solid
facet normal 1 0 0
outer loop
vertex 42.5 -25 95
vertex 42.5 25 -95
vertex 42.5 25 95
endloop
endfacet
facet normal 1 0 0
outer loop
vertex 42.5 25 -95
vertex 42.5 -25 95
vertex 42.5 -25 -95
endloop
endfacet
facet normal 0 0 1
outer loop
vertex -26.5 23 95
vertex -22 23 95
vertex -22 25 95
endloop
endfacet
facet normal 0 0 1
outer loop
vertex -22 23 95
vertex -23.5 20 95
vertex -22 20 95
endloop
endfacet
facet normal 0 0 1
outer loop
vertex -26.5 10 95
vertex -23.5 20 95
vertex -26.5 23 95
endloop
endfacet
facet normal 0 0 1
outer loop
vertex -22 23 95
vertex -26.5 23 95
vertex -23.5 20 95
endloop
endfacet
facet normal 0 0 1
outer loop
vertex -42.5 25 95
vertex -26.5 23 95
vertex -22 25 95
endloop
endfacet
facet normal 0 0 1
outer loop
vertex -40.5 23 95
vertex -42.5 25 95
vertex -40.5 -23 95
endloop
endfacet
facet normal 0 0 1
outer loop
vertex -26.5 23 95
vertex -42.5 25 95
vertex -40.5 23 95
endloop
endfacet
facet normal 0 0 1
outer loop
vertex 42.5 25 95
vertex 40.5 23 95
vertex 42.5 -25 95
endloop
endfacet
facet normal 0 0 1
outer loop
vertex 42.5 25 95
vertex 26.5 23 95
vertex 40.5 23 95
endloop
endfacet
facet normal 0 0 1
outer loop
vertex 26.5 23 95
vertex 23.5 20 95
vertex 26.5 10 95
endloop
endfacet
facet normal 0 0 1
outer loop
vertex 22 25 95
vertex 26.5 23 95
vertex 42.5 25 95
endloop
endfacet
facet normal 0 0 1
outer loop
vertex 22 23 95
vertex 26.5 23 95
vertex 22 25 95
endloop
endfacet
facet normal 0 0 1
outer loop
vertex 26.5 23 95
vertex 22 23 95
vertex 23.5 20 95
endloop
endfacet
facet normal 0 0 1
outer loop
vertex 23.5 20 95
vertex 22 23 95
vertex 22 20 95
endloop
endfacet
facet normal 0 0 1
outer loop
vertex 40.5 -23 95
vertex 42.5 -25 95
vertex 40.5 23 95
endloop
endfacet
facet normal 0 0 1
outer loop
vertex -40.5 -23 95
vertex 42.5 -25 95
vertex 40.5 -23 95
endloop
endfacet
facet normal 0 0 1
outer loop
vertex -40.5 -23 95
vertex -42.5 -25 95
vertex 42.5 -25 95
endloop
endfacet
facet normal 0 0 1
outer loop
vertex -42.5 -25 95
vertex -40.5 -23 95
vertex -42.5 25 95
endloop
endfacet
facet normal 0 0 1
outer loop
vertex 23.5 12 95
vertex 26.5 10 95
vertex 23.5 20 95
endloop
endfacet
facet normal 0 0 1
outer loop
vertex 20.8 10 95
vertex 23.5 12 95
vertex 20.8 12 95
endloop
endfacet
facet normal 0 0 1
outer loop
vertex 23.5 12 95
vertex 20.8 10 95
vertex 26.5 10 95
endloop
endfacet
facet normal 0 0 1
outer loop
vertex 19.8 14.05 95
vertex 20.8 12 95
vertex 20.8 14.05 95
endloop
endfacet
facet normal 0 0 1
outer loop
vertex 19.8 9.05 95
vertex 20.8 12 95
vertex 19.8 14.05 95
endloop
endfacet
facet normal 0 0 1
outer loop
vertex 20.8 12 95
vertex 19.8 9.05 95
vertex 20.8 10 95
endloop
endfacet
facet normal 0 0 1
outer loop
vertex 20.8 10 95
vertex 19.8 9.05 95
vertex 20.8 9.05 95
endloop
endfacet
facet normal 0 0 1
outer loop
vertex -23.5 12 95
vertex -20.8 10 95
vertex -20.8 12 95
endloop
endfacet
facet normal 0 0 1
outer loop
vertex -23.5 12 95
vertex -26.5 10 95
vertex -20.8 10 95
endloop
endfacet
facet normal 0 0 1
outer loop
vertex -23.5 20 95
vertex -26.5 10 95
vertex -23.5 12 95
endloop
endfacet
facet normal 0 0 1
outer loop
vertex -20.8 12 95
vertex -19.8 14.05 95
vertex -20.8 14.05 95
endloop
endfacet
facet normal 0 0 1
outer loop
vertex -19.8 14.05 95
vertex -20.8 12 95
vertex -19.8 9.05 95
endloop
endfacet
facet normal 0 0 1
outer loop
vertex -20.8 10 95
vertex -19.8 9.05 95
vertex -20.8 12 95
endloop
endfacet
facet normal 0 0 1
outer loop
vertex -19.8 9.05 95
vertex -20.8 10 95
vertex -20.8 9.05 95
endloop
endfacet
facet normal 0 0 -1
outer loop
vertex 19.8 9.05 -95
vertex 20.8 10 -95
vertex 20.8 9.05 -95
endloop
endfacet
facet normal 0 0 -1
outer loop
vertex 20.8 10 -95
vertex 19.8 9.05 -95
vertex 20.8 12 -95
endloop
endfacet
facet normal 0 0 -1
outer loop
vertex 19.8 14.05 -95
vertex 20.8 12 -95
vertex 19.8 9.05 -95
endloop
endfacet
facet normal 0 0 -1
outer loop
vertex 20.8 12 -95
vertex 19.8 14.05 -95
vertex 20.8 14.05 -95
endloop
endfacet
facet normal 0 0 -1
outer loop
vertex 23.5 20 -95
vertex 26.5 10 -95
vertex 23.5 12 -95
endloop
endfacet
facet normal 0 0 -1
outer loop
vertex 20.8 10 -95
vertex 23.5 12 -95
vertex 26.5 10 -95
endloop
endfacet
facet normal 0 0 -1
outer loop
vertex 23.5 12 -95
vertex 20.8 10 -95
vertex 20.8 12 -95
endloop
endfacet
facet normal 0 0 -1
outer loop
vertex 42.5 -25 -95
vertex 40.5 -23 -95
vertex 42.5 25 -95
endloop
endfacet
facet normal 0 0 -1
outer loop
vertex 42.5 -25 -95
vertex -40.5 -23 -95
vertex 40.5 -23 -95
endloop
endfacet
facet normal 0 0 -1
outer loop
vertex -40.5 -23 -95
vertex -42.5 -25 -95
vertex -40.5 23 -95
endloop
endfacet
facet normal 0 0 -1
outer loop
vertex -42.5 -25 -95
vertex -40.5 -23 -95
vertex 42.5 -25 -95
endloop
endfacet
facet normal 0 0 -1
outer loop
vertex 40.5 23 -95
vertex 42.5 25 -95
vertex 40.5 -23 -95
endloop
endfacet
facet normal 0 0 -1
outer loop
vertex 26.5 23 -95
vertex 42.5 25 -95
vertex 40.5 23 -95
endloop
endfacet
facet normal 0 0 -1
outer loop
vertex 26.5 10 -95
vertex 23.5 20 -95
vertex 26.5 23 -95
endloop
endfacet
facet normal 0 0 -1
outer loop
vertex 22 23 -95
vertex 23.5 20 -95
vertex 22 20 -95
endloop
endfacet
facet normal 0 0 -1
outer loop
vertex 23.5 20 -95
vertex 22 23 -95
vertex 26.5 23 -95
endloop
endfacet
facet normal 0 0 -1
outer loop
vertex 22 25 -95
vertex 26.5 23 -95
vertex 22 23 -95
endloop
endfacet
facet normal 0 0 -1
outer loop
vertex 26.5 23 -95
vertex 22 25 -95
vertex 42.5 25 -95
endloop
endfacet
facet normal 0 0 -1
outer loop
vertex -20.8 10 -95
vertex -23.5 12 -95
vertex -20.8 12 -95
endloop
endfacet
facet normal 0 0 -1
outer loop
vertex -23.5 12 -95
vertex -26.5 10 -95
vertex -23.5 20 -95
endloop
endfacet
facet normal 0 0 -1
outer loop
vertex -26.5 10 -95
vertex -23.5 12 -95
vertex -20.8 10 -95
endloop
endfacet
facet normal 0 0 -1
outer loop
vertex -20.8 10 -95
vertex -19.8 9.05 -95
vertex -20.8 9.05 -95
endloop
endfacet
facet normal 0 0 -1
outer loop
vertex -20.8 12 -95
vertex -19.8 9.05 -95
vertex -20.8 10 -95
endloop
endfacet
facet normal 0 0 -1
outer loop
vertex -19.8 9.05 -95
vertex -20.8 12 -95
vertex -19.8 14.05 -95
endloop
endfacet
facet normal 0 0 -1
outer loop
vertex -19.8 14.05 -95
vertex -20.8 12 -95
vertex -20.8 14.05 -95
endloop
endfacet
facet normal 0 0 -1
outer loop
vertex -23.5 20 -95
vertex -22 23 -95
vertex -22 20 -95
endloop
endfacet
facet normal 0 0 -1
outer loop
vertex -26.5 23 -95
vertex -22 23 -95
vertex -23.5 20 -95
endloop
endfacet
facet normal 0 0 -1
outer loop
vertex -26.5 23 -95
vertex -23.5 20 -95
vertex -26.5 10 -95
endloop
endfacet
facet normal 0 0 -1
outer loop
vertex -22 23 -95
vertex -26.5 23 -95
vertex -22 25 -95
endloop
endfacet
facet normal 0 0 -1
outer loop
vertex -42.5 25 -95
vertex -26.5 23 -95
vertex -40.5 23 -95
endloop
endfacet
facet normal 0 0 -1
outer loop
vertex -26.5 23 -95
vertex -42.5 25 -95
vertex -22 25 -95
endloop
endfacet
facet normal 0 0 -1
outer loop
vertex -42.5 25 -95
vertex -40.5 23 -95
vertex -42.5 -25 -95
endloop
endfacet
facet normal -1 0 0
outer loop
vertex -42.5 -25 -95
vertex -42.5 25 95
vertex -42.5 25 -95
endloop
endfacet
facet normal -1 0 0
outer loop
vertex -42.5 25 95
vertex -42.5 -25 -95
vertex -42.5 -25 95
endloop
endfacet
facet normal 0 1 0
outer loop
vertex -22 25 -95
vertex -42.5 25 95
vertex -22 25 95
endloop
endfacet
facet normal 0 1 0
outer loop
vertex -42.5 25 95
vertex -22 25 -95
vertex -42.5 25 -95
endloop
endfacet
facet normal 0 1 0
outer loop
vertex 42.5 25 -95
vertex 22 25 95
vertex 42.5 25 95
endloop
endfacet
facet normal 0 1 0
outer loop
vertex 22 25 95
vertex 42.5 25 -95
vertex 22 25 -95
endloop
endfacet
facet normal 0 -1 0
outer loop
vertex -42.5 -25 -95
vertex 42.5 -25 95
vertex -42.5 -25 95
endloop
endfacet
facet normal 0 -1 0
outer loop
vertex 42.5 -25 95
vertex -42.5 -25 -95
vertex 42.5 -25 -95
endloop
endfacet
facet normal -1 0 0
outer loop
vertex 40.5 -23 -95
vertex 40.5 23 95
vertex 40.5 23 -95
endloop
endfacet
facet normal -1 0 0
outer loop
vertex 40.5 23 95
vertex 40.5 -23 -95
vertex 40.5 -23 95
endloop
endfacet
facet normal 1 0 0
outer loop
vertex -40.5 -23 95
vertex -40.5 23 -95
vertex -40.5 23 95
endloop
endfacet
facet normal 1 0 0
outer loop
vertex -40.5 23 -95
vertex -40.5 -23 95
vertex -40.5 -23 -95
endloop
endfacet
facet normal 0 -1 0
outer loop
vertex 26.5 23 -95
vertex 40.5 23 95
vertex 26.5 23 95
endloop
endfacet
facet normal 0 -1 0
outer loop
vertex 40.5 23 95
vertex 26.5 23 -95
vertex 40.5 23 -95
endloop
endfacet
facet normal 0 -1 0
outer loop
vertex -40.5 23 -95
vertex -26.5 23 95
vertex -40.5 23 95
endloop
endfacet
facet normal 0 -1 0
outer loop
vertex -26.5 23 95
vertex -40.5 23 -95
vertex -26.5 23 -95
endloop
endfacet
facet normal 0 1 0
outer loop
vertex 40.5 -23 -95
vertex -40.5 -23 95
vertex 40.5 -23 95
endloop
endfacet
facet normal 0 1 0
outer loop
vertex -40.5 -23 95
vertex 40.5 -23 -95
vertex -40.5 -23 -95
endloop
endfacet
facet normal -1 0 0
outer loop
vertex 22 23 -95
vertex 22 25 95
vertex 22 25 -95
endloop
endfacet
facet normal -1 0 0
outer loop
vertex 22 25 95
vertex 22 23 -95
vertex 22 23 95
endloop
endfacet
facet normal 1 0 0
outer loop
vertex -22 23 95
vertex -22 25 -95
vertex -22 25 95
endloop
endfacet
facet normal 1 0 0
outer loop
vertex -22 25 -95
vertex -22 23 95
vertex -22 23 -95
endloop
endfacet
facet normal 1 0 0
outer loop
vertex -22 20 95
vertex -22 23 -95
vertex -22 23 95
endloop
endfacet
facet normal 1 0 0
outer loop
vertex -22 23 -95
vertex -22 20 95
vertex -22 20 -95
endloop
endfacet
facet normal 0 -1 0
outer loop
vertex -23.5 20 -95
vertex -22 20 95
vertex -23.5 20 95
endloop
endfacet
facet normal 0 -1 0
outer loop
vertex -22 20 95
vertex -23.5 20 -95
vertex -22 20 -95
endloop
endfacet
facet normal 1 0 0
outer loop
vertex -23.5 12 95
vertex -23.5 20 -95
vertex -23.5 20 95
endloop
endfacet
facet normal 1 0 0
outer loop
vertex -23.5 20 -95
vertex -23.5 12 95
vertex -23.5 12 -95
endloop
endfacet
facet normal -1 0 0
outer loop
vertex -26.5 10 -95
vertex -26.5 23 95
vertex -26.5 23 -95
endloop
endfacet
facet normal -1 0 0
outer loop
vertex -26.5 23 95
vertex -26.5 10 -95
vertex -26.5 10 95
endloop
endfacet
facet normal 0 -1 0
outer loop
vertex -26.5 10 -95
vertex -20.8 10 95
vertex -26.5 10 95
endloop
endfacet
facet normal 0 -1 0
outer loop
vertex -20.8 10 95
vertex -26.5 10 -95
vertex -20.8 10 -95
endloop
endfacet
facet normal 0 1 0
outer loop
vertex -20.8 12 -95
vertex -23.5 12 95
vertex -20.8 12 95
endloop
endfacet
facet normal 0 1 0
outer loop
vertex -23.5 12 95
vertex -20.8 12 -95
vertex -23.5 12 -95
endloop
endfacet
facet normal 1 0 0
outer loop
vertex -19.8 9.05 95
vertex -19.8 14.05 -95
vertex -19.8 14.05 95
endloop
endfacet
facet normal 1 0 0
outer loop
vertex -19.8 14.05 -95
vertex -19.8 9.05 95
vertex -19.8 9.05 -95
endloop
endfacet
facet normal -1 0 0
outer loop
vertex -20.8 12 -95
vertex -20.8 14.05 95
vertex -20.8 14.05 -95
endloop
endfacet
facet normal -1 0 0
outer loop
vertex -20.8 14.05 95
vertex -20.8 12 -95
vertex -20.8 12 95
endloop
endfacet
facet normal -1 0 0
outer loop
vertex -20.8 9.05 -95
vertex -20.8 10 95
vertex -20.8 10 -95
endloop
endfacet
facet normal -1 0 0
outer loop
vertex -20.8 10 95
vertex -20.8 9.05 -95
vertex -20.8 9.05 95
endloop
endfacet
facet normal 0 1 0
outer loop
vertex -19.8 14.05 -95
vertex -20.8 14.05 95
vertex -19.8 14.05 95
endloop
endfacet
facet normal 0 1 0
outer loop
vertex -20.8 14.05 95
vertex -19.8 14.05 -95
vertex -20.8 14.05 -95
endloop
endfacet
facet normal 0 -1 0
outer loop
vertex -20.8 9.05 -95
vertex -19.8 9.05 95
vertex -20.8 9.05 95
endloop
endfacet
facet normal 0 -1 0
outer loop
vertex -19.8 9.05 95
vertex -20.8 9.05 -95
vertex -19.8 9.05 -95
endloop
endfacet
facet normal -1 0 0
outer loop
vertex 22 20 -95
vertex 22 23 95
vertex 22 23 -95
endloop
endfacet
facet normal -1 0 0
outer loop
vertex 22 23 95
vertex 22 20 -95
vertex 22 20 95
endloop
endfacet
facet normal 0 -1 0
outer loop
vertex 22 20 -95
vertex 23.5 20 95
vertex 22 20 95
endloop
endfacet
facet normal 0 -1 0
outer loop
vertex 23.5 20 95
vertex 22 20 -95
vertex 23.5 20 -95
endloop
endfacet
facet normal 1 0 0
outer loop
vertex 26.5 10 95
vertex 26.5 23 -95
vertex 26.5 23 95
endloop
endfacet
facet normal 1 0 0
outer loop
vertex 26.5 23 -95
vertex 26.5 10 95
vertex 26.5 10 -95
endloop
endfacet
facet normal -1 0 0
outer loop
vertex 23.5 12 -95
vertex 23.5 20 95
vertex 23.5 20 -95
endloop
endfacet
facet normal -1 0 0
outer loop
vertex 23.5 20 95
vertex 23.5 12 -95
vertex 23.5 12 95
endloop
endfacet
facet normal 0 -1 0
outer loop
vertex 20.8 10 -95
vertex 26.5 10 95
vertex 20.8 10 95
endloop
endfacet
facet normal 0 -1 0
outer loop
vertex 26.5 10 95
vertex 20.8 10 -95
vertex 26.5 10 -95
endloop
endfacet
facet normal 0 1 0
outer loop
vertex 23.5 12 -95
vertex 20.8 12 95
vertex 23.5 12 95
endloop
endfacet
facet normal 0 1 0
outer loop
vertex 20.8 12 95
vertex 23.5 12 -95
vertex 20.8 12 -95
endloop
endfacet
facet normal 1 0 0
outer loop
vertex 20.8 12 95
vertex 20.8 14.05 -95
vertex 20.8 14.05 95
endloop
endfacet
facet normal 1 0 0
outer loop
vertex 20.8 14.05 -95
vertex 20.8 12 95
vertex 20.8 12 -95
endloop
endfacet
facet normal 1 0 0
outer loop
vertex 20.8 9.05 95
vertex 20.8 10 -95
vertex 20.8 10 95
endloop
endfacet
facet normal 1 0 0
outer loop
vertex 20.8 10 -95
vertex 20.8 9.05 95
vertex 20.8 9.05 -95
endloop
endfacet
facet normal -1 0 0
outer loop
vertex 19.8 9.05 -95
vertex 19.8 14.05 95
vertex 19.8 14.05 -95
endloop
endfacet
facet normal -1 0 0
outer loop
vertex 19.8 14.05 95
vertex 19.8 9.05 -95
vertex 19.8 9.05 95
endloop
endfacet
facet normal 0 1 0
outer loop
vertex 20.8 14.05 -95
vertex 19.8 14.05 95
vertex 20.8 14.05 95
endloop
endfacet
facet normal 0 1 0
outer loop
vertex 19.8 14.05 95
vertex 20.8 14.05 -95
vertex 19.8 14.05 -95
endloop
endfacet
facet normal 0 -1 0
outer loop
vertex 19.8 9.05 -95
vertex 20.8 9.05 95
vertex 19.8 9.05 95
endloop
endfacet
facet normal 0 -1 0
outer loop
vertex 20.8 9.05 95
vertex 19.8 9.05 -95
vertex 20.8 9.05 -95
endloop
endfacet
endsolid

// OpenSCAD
epaisseur = 2;
largeur = 85;
hauteur = 50;
longueur = 190;
largeur_fente = 44;

module tube(longueur, largeur, hauteur){
    difference(){
        cube([largeur, hauteur, longueur], center=true);
        cube([largeur-2*epaisseur, hauteur-2*epaisseur, longueur+2], center=true);
    }
}

module reglette(){
    difference(){
        tube(longueur, largeur, hauteur);
        translate([0,(hauteur-epaisseur)/2,0])
        cube([largeur_fente, 2*epaisseur, longueur+2], center=true);
    }
    
    translate([-largeur_fente/2-epaisseur,(hauteur-3)/2-epaisseur,0])
    cube([2*epaisseur, 3, longueur],center=true);
    translate([-largeur_fente/2-1.5*epaisseur,(hauteur-13)/2-epaisseur,0])
    cube([1.5*epaisseur, 13, longueur],center=true);
    translate([-largeur_fente/2,(hauteur+epaisseur)/2-13-epaisseur,0])
    cube([4, epaisseur, longueur],center=true);
    translate([-largeur_fente/2+1.7,(hauteur+epaisseur)/2-12.45-epaisseur,0])
    cube([epaisseur/2, 5, longueur],center=true);
    
    translate([largeur_fente/2+epaisseur,(hauteur-3)/2-epaisseur,0])
    cube([2*epaisseur, 3, longueur],center=true);
    translate([largeur_fente/2+1.5*epaisseur,(hauteur-13)/2-epaisseur,0])
    cube([1.5*epaisseur, 13, longueur],center=true);
    translate([largeur_fente/2,(hauteur+epaisseur)/2-13-epaisseur,0])
    cube([4, epaisseur, longueur],center=true);
    translate([largeur_fente/2-1.7,(hauteur+epaisseur)/2-12.45-epaisseur,0])
    cube([epaisseur/2, 5, longueur],center=true);
}


module reference(){
color("red")
linear_extrude(10) 
scale(1.05)
import("reglette_1.dxf");
translate([47,14,0])
 #color("blue")
#cube([10,44,44]);
}
reglette();
